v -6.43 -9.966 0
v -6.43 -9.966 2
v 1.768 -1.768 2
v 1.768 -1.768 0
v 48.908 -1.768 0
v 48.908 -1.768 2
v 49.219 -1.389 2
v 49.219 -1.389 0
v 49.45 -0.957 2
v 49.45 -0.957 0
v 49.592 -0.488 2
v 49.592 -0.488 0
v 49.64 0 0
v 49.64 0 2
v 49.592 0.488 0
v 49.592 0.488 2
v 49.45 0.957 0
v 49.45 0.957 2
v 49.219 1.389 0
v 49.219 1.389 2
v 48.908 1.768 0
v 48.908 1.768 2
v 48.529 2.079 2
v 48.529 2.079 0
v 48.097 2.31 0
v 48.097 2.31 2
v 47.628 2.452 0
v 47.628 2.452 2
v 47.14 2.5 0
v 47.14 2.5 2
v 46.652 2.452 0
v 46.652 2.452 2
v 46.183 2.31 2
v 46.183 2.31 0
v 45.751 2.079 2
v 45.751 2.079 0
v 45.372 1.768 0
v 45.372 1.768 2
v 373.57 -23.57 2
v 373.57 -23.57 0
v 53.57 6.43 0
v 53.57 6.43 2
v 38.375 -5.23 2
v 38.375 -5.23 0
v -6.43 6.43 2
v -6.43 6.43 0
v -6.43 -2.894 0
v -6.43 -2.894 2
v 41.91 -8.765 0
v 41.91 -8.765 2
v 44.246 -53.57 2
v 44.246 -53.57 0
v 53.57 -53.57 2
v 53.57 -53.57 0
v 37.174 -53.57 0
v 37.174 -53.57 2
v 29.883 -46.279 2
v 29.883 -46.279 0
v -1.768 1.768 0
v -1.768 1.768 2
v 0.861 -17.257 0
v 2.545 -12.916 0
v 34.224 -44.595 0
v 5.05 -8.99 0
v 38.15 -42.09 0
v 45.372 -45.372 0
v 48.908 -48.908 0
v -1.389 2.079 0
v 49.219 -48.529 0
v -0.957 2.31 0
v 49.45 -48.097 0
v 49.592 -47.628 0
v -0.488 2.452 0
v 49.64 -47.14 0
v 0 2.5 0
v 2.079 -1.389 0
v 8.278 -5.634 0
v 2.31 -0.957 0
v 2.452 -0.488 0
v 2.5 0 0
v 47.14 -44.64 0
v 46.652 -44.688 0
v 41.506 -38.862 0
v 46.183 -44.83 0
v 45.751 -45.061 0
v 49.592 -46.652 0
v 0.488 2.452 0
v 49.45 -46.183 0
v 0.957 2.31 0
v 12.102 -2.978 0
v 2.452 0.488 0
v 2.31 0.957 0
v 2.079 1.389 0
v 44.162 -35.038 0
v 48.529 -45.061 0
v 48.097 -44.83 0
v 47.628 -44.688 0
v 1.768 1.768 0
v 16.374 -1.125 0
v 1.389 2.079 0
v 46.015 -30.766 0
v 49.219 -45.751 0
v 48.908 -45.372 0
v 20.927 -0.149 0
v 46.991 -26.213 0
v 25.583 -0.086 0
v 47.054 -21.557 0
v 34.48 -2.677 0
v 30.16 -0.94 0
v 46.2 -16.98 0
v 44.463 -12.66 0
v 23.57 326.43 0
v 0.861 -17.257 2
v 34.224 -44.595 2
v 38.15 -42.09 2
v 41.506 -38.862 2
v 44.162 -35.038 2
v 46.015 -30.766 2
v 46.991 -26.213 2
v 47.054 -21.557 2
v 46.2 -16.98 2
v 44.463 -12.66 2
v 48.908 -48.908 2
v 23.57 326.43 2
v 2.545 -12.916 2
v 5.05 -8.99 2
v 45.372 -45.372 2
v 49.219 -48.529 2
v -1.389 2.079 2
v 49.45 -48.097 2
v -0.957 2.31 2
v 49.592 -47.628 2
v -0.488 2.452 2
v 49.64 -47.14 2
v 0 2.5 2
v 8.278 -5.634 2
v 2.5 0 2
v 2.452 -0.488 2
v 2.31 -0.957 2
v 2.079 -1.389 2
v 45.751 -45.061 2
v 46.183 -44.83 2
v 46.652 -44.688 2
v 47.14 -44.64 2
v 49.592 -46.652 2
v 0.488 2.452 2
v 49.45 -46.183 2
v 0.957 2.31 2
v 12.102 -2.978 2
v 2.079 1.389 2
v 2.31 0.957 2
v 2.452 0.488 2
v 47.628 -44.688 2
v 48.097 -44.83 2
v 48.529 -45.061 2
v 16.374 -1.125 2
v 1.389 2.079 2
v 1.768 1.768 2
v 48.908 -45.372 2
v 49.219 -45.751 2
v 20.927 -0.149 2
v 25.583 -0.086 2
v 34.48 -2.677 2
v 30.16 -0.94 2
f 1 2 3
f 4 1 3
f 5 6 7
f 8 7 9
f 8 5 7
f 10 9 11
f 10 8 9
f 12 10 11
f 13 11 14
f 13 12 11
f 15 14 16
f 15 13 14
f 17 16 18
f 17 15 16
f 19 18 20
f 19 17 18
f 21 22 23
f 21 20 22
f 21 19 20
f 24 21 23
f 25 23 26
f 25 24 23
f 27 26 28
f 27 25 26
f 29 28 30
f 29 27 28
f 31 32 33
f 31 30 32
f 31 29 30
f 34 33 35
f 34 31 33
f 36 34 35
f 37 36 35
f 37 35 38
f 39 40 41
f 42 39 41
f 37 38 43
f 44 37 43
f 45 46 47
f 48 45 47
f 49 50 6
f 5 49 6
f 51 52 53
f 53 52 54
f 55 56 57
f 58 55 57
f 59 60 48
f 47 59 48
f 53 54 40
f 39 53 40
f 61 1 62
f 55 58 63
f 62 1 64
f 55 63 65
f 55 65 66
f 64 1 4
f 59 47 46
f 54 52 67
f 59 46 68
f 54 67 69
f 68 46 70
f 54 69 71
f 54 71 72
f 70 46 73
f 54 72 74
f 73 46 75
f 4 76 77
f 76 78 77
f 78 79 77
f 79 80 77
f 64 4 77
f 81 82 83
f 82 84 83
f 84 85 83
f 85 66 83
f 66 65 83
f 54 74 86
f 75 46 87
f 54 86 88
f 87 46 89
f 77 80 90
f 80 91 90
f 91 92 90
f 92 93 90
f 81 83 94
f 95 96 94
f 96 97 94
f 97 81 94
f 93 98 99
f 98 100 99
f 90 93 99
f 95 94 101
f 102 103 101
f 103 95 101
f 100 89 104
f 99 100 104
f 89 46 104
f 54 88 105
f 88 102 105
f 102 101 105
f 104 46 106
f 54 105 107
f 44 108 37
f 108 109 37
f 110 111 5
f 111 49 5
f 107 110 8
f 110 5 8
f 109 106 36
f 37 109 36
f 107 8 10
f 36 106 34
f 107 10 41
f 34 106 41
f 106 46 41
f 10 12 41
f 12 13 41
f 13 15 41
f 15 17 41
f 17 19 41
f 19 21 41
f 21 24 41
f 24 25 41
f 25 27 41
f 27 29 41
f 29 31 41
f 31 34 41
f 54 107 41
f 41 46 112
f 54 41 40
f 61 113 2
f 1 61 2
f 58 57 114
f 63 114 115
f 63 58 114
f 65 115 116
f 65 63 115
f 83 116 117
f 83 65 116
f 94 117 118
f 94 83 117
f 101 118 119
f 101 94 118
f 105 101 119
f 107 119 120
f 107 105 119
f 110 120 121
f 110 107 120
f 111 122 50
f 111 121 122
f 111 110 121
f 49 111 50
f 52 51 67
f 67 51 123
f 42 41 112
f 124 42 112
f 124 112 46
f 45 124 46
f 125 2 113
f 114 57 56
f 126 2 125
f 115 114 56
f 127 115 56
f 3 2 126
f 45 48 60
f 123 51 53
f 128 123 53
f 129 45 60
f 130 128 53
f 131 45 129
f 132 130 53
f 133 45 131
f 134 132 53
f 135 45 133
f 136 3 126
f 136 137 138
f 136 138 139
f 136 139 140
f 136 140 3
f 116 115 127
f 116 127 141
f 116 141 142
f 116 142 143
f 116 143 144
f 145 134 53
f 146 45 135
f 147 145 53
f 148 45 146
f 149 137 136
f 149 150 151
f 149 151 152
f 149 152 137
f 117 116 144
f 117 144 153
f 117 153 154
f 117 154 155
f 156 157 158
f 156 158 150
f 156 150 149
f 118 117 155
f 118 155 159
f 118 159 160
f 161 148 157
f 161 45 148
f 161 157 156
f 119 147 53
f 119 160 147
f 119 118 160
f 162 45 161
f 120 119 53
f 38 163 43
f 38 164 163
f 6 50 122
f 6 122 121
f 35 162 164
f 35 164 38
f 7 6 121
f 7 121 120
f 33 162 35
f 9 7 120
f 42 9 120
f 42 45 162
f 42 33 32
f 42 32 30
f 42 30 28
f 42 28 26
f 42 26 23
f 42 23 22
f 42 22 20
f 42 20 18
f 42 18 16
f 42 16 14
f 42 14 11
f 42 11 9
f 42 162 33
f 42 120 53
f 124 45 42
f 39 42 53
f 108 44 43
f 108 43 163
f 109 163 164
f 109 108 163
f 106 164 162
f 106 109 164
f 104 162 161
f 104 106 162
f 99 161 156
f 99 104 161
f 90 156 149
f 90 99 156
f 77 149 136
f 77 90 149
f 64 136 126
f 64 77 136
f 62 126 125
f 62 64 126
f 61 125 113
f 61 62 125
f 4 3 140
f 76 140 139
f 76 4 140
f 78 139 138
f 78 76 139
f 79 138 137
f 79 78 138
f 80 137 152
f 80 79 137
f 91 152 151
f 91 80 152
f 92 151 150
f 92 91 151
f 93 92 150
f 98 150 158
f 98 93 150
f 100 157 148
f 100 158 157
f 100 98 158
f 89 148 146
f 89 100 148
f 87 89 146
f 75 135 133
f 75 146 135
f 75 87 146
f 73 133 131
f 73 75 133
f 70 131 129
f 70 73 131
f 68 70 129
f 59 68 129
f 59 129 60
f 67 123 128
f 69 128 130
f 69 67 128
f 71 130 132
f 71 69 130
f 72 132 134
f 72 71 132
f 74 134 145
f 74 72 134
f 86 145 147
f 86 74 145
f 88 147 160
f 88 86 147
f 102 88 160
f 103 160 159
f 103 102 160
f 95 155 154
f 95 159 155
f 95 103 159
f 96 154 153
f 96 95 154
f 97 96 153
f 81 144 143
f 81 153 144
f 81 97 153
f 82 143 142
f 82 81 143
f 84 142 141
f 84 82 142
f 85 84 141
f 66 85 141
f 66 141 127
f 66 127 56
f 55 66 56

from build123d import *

# Parameters (mm, degrees)
SKETCH_1_R          = 2.5
SKETCH_1_R_2        = 23.57
EXTRUDE_1_DEPTH     = 2
CUT_EXTRUDE_1_DEPTH = 2


with BuildPart() as part:
    # 草图1 → 凸台-拉伸1 (new body)
    with BuildSketch(Plane.XY):
        Polygon((53.57, -53.57), (373.57, -23.57), (53.57, 6.43), (23.57, 326.43), (-6.43, 6.43), (-6.43, -53.57), align=None)
        Circle(SKETCH_1_R, mode=Mode.SUBTRACT)
        with Locations((47.14, 0)):
            Circle(SKETCH_1_R, mode=Mode.SUBTRACT)
        with Locations((0, -47.14)):
            Circle(SKETCH_1_R, mode=Mode.SUBTRACT)
        with Locations((47.14, -47.14)):
            Circle(SKETCH_1_R, mode=Mode.SUBTRACT)
        with Locations((23.57, -23.57)):
            Circle(SKETCH_1_R_2, mode=Mode.SUBTRACT)
    extrude(amount=EXTRUDE_1_DEPTH)

    # 草图2 → 切除-拉伸1 (cut)
    with BuildSketch(Plane.XY.offset(2)):
        Polygon((-1.767766953, 1.767766953), (-23.224943384, -19.689409478), (-48.141739781, -16.773526249), (-61.418914174, -41.57875584), (11.806639012, -99.639884024), (27.505819552, -70.309714354), (48.907766953, -48.907766953), (45.372233047, -45.372233047), (37.174466094, -53.57), (-6.43, -9.965533906), (1.767766953, -1.767766953), align=None)
        Polygon((45.372233047, 1.767766953), (27.505819552, -16.098646542), (32.100864157, -18.574669749), (48.907766953, -1.767766953), align=None)
    extrude(amount=-CUT_EXTRUDE_1_DEPTH, mode=Mode.SUBTRACT)


solid = part.part
